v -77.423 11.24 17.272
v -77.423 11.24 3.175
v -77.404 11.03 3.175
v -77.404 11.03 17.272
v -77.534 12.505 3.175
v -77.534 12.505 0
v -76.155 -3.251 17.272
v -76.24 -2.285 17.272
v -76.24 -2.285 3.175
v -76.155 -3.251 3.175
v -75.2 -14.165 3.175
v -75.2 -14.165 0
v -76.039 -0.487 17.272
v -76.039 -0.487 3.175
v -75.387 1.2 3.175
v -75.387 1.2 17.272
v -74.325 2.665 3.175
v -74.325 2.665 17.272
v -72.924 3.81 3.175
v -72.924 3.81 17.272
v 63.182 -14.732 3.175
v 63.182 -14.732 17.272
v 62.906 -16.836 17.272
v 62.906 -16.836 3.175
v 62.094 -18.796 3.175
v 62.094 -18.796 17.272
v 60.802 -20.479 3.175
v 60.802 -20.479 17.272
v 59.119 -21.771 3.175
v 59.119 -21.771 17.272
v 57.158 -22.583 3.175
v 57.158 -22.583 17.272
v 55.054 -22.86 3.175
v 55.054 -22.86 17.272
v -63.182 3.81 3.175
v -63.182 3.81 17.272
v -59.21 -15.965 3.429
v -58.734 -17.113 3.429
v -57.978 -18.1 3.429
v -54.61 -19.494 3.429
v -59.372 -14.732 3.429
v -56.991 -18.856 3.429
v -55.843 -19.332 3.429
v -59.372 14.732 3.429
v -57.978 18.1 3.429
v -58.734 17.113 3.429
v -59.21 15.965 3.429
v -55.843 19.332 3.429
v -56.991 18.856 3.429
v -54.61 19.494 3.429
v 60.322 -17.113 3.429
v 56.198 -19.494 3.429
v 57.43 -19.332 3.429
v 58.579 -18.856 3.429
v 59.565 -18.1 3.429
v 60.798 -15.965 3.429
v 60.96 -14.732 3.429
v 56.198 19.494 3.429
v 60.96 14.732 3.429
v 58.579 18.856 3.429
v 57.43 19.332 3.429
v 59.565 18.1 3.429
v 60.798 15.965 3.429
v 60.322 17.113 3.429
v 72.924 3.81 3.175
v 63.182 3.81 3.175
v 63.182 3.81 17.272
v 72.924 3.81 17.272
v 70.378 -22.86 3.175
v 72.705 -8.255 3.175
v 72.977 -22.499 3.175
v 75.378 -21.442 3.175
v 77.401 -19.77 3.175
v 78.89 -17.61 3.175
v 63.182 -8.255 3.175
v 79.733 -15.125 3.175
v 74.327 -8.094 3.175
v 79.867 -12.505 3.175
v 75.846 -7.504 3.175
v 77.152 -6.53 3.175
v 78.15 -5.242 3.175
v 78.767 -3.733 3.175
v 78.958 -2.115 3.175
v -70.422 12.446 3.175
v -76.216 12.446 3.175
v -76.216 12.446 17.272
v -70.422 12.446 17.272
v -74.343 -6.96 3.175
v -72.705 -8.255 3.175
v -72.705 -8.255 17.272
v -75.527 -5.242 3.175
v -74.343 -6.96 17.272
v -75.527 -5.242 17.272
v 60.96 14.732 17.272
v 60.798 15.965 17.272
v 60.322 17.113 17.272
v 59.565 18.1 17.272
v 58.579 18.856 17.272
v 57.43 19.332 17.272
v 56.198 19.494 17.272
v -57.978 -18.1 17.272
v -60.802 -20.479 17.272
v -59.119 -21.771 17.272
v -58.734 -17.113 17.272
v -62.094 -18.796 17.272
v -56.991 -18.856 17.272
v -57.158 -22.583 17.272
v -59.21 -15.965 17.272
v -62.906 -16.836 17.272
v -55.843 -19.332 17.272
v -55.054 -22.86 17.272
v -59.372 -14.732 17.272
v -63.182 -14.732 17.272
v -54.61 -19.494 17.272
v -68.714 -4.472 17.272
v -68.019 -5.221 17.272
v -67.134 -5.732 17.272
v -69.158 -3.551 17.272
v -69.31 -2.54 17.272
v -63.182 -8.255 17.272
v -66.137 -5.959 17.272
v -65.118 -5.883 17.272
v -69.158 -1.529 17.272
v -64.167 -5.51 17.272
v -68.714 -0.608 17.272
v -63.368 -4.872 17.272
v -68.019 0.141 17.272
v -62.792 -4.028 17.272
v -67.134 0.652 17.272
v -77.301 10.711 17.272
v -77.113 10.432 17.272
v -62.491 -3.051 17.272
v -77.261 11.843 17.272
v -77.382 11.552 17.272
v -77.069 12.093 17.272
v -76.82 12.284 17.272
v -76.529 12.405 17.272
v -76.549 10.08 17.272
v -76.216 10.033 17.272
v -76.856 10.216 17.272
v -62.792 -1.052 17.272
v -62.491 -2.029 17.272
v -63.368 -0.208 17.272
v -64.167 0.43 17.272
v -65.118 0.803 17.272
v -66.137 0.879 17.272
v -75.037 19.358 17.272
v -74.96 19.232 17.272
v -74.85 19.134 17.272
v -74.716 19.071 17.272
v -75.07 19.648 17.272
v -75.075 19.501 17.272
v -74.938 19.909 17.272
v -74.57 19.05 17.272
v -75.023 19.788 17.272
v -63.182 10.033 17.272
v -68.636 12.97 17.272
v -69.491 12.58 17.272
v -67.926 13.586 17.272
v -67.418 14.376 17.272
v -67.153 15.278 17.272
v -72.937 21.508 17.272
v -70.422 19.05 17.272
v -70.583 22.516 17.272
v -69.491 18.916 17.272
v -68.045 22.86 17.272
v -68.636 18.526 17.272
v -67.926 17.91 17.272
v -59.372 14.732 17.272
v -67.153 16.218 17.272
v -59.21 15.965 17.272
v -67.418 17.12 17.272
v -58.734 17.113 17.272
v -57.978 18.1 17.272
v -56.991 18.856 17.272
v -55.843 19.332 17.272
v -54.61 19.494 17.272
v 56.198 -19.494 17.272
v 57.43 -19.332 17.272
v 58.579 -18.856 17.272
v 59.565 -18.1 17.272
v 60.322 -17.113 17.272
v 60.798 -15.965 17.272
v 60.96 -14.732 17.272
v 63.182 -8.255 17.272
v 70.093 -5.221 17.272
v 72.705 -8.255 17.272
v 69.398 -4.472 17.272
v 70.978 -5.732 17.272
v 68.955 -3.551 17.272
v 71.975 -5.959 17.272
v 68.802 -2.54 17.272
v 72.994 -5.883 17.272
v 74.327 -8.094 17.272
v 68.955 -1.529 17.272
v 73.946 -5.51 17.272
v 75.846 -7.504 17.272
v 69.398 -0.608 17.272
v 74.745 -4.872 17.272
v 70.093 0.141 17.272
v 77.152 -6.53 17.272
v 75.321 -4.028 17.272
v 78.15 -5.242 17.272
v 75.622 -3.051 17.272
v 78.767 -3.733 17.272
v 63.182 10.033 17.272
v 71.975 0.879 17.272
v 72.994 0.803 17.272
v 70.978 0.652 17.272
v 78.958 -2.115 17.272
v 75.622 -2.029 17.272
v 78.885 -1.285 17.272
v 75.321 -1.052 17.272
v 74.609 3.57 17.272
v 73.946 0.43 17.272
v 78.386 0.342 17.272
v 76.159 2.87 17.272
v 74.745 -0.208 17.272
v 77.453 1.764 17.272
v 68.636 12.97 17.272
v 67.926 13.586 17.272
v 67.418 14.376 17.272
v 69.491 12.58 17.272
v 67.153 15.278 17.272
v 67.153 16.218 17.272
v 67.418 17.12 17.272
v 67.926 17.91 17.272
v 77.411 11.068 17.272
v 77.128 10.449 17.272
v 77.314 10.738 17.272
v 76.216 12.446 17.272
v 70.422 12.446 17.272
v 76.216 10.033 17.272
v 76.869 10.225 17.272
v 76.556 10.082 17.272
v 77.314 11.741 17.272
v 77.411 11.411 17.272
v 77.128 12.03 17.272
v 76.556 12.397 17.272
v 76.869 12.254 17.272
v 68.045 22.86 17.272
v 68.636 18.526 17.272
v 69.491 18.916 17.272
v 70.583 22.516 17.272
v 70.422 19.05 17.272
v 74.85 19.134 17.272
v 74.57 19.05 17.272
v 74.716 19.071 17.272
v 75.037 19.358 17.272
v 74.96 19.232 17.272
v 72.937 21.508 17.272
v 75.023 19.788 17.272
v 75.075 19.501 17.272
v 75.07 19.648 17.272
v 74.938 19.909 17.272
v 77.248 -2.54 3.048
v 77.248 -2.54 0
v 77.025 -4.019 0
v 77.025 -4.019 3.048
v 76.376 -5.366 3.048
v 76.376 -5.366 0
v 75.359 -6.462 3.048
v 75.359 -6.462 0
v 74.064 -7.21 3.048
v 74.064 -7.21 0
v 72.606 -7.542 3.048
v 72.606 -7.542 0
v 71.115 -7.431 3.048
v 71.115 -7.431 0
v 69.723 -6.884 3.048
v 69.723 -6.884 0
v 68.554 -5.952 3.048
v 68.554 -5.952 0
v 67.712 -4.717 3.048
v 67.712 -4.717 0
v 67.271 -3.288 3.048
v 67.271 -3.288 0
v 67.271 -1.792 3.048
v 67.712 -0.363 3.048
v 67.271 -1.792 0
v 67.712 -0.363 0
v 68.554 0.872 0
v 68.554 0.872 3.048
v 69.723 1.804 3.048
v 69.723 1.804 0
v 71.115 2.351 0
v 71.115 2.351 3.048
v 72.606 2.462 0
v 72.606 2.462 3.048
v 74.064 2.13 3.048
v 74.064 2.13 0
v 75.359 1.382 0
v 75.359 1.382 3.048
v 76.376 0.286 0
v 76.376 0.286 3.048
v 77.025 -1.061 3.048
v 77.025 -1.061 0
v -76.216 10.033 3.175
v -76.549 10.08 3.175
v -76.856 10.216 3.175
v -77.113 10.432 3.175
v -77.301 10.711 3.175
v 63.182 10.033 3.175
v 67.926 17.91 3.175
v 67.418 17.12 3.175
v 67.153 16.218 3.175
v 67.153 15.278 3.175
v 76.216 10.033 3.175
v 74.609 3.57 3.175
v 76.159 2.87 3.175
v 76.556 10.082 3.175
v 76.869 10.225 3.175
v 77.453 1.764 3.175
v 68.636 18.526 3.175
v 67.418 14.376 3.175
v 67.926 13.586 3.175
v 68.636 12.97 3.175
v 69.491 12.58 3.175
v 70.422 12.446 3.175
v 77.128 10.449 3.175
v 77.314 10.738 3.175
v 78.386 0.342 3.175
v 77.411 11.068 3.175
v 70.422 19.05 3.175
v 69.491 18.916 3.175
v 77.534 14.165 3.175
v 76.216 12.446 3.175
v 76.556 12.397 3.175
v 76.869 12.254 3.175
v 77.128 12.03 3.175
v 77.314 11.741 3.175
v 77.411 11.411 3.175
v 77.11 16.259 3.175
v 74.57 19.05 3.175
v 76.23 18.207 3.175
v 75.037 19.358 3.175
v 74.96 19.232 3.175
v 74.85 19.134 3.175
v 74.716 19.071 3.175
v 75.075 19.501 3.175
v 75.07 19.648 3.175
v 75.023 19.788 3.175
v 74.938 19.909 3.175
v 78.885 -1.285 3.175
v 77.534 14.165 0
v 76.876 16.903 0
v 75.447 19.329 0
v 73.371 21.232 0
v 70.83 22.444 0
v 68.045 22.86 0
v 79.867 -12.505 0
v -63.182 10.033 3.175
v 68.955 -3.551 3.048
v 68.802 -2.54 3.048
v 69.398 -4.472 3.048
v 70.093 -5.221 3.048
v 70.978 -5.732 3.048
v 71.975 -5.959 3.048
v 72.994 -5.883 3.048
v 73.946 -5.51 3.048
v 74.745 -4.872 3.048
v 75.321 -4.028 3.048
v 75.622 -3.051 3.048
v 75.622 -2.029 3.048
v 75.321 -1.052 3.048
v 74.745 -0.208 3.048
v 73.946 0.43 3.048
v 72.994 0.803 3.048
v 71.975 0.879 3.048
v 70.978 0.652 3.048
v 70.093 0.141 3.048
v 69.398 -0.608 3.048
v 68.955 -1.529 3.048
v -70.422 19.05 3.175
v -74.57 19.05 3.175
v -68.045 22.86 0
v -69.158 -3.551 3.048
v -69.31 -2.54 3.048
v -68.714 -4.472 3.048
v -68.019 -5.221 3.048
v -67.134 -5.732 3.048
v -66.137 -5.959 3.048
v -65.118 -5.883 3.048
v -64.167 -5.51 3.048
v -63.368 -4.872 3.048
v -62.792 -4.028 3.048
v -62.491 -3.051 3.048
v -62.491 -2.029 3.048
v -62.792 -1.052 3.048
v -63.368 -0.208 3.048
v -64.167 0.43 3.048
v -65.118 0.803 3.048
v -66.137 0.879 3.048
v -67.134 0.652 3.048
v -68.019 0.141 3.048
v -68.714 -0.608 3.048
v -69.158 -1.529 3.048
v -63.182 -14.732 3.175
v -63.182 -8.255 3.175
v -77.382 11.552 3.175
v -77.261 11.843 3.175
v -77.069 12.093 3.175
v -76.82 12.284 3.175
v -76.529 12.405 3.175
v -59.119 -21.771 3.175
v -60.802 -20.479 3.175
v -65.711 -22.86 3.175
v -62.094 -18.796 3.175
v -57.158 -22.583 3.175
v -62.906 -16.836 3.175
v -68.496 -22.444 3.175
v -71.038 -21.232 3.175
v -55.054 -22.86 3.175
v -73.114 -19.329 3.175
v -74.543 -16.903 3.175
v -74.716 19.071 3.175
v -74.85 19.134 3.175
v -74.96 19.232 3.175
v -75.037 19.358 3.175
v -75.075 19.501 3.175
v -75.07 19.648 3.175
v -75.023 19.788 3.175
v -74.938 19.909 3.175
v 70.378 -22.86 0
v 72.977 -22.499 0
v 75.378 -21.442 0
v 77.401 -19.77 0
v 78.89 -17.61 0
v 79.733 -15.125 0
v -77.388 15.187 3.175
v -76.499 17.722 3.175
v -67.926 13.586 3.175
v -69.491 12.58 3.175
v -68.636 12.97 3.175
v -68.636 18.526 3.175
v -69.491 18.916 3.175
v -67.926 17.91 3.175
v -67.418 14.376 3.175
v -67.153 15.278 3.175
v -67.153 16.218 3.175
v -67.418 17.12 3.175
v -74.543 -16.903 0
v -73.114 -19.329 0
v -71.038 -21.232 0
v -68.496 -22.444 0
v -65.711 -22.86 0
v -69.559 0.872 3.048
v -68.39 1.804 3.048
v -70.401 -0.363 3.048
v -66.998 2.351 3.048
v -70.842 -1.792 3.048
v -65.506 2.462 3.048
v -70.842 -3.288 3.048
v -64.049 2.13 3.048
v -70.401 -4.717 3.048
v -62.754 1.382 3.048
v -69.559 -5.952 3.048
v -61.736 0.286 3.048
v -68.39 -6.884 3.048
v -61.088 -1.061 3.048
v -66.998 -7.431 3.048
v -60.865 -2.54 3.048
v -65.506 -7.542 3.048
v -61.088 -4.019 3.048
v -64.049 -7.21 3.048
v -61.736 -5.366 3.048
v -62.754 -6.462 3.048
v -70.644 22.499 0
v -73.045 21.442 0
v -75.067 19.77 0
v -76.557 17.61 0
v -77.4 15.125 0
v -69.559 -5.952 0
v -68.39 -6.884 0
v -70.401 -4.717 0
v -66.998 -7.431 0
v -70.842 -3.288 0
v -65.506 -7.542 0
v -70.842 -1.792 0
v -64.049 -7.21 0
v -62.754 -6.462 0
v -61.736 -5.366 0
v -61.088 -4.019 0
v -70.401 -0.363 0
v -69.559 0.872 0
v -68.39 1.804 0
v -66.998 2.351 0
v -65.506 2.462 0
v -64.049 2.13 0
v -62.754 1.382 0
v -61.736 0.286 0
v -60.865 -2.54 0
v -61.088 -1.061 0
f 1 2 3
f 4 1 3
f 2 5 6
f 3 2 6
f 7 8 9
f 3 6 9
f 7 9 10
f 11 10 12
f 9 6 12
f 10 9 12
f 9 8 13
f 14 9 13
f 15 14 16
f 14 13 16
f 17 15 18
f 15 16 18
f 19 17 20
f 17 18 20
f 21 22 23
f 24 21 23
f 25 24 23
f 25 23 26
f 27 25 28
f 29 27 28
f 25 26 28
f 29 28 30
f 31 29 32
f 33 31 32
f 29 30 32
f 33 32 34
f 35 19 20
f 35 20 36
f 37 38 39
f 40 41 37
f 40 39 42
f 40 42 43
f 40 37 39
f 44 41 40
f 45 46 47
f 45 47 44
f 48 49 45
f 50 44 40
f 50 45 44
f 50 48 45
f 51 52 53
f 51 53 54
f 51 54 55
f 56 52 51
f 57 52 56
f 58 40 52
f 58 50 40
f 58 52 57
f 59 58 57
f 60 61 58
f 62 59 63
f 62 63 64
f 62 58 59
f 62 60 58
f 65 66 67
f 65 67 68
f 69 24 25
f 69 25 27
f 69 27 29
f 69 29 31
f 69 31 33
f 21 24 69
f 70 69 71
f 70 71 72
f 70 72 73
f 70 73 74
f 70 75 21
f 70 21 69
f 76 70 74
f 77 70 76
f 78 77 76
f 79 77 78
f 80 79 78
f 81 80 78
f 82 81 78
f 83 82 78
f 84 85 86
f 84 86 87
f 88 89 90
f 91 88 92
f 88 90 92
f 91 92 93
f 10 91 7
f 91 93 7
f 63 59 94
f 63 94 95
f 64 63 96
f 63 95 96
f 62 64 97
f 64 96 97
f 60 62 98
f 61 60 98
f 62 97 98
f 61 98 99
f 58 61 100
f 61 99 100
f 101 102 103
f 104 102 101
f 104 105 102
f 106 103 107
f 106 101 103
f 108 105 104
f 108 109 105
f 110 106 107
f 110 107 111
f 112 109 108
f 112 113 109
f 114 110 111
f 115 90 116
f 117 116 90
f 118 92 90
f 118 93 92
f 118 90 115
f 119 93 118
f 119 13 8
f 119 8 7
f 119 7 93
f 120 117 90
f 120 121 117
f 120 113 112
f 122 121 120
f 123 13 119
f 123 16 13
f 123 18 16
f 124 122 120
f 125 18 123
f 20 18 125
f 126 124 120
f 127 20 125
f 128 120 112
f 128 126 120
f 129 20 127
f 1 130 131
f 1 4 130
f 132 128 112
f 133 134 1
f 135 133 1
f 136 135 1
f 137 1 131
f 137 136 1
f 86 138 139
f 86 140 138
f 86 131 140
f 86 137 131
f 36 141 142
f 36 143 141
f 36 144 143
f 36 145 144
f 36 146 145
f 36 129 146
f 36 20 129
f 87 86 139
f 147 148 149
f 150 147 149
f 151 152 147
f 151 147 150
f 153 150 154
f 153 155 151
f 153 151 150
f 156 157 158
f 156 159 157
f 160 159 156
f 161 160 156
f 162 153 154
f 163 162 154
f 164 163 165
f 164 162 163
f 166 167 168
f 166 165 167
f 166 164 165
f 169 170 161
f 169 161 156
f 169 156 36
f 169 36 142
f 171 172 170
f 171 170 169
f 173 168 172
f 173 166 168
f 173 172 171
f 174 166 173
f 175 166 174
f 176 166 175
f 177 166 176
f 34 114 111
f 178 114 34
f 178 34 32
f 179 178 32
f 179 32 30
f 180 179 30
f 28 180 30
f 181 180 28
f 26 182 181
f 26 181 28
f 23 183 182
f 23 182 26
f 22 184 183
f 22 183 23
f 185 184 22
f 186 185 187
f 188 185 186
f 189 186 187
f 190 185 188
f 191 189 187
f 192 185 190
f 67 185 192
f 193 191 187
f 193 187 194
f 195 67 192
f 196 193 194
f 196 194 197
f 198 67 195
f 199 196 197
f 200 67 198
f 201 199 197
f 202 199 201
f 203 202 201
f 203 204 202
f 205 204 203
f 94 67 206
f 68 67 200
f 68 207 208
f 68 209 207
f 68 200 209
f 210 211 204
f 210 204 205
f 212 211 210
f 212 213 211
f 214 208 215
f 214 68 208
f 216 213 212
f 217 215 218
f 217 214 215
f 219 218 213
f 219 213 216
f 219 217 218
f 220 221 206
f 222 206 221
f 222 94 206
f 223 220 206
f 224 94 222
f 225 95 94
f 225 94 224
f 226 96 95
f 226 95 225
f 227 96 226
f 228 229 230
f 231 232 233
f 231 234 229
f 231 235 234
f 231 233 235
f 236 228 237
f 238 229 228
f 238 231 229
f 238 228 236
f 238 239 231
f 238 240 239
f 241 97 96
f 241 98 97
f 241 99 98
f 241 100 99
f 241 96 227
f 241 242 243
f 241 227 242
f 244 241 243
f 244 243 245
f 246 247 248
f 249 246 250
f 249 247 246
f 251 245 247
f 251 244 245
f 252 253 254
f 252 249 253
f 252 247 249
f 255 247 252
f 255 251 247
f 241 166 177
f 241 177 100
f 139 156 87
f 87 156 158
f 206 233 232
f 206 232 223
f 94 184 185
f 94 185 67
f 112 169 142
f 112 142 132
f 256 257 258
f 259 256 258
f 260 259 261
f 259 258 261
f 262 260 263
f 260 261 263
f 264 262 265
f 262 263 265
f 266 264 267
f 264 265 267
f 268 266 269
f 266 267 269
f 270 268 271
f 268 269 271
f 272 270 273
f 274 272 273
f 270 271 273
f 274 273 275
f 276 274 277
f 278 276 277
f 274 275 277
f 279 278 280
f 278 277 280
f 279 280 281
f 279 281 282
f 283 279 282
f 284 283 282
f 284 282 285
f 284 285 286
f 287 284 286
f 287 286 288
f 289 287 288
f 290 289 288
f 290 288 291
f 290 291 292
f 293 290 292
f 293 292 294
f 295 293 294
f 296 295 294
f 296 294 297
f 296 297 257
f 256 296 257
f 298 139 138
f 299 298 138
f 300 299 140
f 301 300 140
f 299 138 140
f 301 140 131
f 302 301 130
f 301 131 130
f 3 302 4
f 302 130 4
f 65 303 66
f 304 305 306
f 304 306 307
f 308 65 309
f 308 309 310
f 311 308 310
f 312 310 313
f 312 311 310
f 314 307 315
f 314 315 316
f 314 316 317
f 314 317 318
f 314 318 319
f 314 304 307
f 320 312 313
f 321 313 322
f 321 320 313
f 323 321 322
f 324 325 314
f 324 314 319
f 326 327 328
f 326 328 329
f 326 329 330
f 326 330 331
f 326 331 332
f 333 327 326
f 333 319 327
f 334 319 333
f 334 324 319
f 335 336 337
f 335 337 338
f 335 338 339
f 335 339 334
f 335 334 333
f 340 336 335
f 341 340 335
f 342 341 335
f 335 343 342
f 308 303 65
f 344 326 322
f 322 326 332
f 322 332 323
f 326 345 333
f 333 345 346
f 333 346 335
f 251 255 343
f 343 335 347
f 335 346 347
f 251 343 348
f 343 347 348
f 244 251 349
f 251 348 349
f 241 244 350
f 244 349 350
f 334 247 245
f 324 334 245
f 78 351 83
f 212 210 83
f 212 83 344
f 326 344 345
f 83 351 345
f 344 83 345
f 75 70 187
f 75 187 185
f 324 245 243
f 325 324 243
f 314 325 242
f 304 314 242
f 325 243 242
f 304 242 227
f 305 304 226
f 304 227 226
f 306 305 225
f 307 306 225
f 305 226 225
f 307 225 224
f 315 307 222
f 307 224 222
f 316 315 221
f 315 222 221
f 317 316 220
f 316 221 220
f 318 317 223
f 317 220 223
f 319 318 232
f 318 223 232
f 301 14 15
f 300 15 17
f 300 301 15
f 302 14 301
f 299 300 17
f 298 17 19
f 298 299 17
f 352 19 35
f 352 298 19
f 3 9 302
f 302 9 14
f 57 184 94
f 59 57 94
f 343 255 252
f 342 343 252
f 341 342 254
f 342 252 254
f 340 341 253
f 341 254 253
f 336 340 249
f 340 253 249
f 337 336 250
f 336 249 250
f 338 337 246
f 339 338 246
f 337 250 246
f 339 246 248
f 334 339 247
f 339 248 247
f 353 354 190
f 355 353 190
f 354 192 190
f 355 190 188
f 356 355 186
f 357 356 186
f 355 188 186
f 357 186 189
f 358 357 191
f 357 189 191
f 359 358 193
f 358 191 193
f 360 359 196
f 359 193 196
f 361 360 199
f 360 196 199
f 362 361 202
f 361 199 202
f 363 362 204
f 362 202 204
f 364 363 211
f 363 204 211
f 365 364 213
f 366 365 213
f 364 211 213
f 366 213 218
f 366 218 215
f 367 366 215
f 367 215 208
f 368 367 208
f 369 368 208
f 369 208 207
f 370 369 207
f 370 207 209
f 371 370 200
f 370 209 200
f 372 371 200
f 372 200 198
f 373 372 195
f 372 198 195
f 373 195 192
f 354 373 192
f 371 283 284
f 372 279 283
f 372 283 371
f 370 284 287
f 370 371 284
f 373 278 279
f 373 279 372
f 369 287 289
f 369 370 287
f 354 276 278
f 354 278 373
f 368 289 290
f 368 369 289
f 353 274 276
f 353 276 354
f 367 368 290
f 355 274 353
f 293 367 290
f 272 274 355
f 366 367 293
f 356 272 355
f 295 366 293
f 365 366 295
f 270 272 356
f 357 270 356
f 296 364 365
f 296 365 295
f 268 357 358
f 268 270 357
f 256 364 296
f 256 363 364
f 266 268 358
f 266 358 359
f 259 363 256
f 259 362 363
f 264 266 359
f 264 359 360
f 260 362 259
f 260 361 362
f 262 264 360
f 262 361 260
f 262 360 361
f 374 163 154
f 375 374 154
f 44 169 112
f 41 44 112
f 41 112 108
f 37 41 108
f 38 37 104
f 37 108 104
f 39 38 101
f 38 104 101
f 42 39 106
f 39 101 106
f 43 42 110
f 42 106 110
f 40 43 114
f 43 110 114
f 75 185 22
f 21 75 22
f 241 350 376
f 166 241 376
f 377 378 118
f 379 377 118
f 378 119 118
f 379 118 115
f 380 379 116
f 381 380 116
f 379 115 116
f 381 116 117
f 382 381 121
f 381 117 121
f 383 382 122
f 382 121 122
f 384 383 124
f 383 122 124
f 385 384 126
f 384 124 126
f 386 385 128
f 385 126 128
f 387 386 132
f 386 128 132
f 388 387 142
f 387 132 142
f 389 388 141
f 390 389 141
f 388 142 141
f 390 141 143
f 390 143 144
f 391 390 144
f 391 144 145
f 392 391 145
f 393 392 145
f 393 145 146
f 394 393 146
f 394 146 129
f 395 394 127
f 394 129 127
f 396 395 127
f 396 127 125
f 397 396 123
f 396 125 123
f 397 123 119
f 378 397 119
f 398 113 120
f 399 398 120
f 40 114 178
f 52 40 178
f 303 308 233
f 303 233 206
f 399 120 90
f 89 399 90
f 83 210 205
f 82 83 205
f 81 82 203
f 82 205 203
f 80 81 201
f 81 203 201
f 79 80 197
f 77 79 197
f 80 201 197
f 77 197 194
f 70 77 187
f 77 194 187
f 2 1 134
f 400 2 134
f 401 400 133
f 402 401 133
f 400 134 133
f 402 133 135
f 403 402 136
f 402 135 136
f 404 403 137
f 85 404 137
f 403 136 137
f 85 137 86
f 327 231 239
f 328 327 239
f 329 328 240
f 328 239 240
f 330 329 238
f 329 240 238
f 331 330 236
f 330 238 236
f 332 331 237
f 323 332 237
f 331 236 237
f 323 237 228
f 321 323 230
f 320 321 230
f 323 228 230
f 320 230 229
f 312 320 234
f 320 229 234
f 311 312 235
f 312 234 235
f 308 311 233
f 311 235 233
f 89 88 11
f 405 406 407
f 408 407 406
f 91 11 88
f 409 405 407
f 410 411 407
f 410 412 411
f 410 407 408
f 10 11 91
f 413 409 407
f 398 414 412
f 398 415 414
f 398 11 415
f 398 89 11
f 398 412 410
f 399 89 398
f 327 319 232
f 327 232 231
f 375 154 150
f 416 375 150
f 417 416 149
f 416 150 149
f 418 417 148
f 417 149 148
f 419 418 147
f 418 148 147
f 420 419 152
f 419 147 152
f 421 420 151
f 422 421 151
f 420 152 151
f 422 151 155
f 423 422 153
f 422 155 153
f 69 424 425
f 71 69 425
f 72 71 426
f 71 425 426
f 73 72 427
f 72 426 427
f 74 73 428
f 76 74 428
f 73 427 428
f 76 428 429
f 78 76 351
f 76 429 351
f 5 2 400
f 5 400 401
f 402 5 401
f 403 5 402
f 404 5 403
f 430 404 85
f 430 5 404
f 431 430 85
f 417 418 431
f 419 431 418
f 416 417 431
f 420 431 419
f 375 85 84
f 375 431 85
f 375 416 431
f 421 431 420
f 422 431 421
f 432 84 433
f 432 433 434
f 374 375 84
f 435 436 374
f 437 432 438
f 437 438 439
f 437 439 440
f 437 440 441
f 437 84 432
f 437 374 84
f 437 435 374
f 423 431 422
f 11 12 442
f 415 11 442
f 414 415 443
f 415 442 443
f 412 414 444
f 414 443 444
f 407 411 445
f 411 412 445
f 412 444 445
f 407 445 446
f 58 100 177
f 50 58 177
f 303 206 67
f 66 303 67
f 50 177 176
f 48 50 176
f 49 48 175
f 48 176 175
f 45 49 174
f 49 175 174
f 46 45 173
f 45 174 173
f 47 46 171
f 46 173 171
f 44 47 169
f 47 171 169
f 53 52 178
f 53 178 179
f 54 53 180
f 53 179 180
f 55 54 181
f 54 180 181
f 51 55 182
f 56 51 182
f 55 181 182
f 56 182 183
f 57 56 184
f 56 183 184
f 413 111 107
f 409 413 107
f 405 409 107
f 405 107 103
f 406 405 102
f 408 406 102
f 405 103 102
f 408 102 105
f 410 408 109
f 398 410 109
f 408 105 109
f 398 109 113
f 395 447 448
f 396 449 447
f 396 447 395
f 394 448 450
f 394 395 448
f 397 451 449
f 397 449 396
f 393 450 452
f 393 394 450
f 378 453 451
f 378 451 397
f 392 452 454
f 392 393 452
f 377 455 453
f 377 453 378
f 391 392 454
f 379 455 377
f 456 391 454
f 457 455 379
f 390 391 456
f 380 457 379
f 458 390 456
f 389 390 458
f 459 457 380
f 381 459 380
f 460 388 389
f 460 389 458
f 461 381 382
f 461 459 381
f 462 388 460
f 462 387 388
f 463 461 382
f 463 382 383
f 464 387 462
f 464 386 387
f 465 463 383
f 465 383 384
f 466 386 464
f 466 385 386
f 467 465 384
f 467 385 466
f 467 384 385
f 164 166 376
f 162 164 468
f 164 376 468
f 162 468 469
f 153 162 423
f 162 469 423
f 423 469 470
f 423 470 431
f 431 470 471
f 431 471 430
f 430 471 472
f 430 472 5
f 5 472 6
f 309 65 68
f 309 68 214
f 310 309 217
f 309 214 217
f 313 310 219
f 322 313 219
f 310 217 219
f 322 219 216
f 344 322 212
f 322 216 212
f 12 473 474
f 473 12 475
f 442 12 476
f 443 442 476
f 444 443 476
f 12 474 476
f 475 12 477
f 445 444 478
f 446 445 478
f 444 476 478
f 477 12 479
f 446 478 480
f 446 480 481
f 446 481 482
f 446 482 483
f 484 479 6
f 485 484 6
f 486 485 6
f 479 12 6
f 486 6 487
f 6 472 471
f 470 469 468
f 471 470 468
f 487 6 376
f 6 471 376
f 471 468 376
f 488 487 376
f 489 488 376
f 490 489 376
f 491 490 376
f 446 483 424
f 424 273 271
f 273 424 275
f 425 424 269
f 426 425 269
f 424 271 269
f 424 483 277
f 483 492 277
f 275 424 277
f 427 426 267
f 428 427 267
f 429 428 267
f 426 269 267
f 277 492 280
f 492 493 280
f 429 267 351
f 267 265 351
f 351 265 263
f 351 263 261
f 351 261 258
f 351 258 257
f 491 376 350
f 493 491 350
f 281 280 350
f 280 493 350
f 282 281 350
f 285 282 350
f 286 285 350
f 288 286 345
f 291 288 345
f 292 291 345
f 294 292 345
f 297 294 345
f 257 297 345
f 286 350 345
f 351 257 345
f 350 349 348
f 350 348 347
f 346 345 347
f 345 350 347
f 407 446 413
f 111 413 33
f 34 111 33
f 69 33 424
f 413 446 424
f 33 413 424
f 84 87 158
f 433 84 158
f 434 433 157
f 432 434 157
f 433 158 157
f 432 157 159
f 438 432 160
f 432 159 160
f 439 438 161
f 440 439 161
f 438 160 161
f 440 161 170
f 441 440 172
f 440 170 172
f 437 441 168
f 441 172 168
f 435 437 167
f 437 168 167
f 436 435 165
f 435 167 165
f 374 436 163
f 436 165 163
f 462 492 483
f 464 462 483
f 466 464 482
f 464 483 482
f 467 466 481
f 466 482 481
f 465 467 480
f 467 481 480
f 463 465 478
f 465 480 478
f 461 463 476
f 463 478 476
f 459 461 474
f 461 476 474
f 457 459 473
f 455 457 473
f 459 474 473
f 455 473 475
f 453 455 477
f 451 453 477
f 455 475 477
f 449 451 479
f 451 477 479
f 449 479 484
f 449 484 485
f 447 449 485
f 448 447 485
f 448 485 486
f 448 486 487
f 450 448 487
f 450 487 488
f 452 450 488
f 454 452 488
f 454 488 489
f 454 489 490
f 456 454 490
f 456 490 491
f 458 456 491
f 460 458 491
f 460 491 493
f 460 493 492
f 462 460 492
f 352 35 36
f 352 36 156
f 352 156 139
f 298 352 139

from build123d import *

# Parameters (mm, degrees)
F1_DEPTH       = 17.272
F3_DEPTH       = 13.843
F5_DEPTH       = 14.097
F7_D           = 6.858
F7_CBORE_D     = 10.033
F7_CBORE_DEPTH = 3.048


# Not quite as in the source:
# - a feature names something its author has since deleted; it is built from what else it names


with BuildPart() as f1:
    # F0 (on Top) → F1 (new body)
    with BuildSketch(Plane.XY):
        with BuildLine():
            Line((68.0447455007, 22.86), (-68.0447455007, 22.86))
            ThreePointArc((-68.0447455007, 22.86), (-75.0673121338, 19.7699967275), (-77.5335, 12.5048415503))
            Line((-77.5335, 12.5048415503), (-75.2001773438, -14.1651584497))
            ThreePointArc((-75.2001773438, -14.1651584497), (-72.146419572, -20.3575666331), (-65.7114228444, -22.86))
            Line((-65.7114228444, -22.86), (70.3780681569, -22.86))
            ThreePointArc((70.3780681569, -22.86), (77.40063479, -19.7699967275), (79.8668226562, -12.5048415503))
            Line((79.8668226562, -12.5048415503), (77.5335, 14.1651584497))
            ThreePointArc((77.5335, 14.1651584497), (74.4797422282, 20.3575666331), (68.0447455007, 22.86))
        make_face()
    extrude(amount=F1_DEPTH)

    # F2 (on face) → F3 (cut)
    with BuildSketch(Plane.XY.offset(17.272)):
        with BuildLine():
            Line((56.1975, 19.4945), (-54.61, 19.4945))
            ThreePointArc((-54.61, 19.4945), (-57.9775960454, 18.0995960454), (-59.3725, 14.732))
            Line((-59.3725, 14.732), (-59.3725, -14.732))
            ThreePointArc((-59.3725, -14.732), (-57.9775960454, -18.0995960454), (-54.61, -19.4945))
            Line((-54.61, -19.4945), (56.1975, -19.4945))
            ThreePointArc((56.1975, -19.4945), (59.5650960454, -18.0995960454), (60.96, -14.732))
            Line((60.96, -14.732), (60.96, 14.732))
            ThreePointArc((60.96, 14.732), (59.5650960454, 18.0995960454), (56.1975, 19.4945))
        make_face()
    extrude(amount=-F3_DEPTH, mode=Mode.SUBTRACT)

    # F4 (on face) → F5 (cut)
    with BuildSketch(Plane.XY.offset(17.272)):
        with BuildLine():
            Line((-76.239581844, -2.2847106486), (-77.4044675129, 11.0299934736))
            ThreePointArc((-77.4044675129, 11.0299934736), (-77.4182058621, 11.1343465964), (-77.4227969589, 11.2395))
            Line((-77.4227969589, 11.2395), (-77.5335, 12.5048415503))
            ThreePointArc((-77.5335, 12.5048415503), (-77.0333154818, 16.4863861544), (-74.9377505887, 19.9085915493))
            ThreePointArc((-74.9377505887, 19.9085915493), (-71.7938897692, 22.0911145638), (-68.0447455007, 22.86))
            Line((-68.0447455007, 22.86), (-80.5285722017, 22.86))
            Line((-80.5285722017, 22.86), (-80.5285722017, -22.86))
            Line((-80.5285722017, -22.86), (-65.7114228444, -22.86))
            ThreePointArc((-65.7114228444, -22.86), (-72.146419572, -20.3575666331), (-75.2001773438, -14.1651584497))
            Line((-75.2001773438, -14.1651584497), (-76.1550120261, -3.2513480896))
            ThreePointArc((-76.1550120261, -3.2513480896), (-76.2140031856, -2.7694909766), (-76.239581844, -2.2847106486))
        make_face()
        with BuildLine():
            Line((-77.5335, 12.5048415503), (-77.4227969589, 11.2395))
            ThreePointArc((-77.4227969589, 11.2395), (-77.0694212904, 12.0926243315), (-76.2162969589, 12.446))
            Line((-76.2162969589, 12.446), (-70.4215, 12.446))
            ThreePointArc((-70.4215, 12.446), (-67.1195, 15.748), (-70.4215, 19.05))
            Line((-70.4215, 19.05), (-74.5701236506, 19.05))
            ThreePointArc((-74.5701236506, 19.05), (-75.0371164274, 19.358045639), (-74.9377505887, 19.9085915493))
            ThreePointArc((-74.9377505887, 19.9085915493), (-77.0333154818, 16.4863861544), (-77.5335, 12.5048415503))
        make_face()
        with BuildLine():
            Line((-63.1825, 3.81), (-63.1825, 10.033))
            Line((-63.1825, 10.033), (-76.2162969589, 10.033))
            ThreePointArc((-76.2162969589, 10.033), (-76.9918202099, 10.3152673794), (-77.4044675129, 11.0299934736))
            Line((-77.4044675129, 11.0299934736), (-76.239581844, -2.2847106486))
            ThreePointArc((-76.239581844, -2.2847106486), (-75.3866698867, 1.2003753653), (-72.9243249481, 3.81))
            Line((-72.9243249481, 3.81), (-63.1825, 3.81))
        make_face()
        with BuildLine():
            ThreePointArc((-72.7051694123, -8.255), (-74.9990780637, -6.1454708758), (-76.1550120261, -3.2513480896))
            Line((-76.1550120261, -3.2513480896), (-75.2001773438, -14.1651584497))
            ThreePointArc((-75.2001773438, -14.1651584497), (-72.146419572, -20.3575666331), (-65.7114228444, -22.86))
            Line((-65.7114228444, -22.86), (-55.0545, -22.86))
            ThreePointArc((-55.0545, -22.86), (-60.8018639175, -20.4793639175), (-63.1825, -14.732))
            Line((-63.1825, -14.732), (-63.1825, -8.255))
            Line((-63.1825, -8.255), (-72.7051694123, -8.255))
        make_face()
        with BuildLine():
            ThreePointArc((63.1825, -14.732), (60.8018639175, -20.4793639175), (55.0545, -22.86))
            Line((55.0545, -22.86), (70.3780681569, -22.86))
            ThreePointArc((70.3780681569, -22.86), (77.40063479, -19.7699967275), (79.8668226562, -12.5048415503))
            Line((79.8668226562, -12.5048415503), (78.9578200825, -2.114894589))
            ThreePointArc((78.9578200825, -2.114894589), (77.1524285249, -6.5300931701), (72.7051694123, -8.255))
            Line((72.7051694123, -8.255), (63.1825, -8.255))
            Line((63.1825, -8.255), (63.1825, -14.732))
        make_face()
        with BuildLine():
            ThreePointArc((77.5335, 14.1651584497), (76.7244498583, 17.2577996716), (74.9377505887, 19.9085915493))
            ThreePointArc((74.9377505887, 19.9085915493), (75.0371164274, 19.358045639), (74.5701236506, 19.05))
            Line((74.5701236506, 19.05), (70.4215, 19.05))
            ThreePointArc((70.4215, 19.05), (67.1195, 15.748), (70.4215, 12.446))
            Line((70.4215, 12.446), (76.2162969589, 12.446))
            ThreePointArc((76.2162969589, 12.446), (77.4227969589, 11.2395), (76.2162969589, 10.033))
            Line((76.2162969589, 10.033), (63.1825, 10.033))
            Line((63.1825, 10.033), (63.1825, 3.81))
            Line((63.1825, 3.81), (72.9243249481, 3.81))
            ThreePointArc((72.9243249481, 3.81), (76.8450400591, 2.3627819378), (78.8851888528, -1.2847158349))
            Line((78.8851888528, -1.2847158349), (77.5335, 14.1651584497))
        make_face()
    extrude(amount=-F5_DEPTH, mode=Mode.SUBTRACT)

    # F7 (through all)
    with Locations(Plane(origin=(0, 0, 0), x_dir=(1, 0, 0), z_dir=(0, 0, -1))):
        with Locations((72.23125, 2.54), (-65.88125, 2.54)):
            CounterBoreHole(F7_D / 2, F7_CBORE_D / 2, F7_CBORE_DEPTH)


solid = f1.part
